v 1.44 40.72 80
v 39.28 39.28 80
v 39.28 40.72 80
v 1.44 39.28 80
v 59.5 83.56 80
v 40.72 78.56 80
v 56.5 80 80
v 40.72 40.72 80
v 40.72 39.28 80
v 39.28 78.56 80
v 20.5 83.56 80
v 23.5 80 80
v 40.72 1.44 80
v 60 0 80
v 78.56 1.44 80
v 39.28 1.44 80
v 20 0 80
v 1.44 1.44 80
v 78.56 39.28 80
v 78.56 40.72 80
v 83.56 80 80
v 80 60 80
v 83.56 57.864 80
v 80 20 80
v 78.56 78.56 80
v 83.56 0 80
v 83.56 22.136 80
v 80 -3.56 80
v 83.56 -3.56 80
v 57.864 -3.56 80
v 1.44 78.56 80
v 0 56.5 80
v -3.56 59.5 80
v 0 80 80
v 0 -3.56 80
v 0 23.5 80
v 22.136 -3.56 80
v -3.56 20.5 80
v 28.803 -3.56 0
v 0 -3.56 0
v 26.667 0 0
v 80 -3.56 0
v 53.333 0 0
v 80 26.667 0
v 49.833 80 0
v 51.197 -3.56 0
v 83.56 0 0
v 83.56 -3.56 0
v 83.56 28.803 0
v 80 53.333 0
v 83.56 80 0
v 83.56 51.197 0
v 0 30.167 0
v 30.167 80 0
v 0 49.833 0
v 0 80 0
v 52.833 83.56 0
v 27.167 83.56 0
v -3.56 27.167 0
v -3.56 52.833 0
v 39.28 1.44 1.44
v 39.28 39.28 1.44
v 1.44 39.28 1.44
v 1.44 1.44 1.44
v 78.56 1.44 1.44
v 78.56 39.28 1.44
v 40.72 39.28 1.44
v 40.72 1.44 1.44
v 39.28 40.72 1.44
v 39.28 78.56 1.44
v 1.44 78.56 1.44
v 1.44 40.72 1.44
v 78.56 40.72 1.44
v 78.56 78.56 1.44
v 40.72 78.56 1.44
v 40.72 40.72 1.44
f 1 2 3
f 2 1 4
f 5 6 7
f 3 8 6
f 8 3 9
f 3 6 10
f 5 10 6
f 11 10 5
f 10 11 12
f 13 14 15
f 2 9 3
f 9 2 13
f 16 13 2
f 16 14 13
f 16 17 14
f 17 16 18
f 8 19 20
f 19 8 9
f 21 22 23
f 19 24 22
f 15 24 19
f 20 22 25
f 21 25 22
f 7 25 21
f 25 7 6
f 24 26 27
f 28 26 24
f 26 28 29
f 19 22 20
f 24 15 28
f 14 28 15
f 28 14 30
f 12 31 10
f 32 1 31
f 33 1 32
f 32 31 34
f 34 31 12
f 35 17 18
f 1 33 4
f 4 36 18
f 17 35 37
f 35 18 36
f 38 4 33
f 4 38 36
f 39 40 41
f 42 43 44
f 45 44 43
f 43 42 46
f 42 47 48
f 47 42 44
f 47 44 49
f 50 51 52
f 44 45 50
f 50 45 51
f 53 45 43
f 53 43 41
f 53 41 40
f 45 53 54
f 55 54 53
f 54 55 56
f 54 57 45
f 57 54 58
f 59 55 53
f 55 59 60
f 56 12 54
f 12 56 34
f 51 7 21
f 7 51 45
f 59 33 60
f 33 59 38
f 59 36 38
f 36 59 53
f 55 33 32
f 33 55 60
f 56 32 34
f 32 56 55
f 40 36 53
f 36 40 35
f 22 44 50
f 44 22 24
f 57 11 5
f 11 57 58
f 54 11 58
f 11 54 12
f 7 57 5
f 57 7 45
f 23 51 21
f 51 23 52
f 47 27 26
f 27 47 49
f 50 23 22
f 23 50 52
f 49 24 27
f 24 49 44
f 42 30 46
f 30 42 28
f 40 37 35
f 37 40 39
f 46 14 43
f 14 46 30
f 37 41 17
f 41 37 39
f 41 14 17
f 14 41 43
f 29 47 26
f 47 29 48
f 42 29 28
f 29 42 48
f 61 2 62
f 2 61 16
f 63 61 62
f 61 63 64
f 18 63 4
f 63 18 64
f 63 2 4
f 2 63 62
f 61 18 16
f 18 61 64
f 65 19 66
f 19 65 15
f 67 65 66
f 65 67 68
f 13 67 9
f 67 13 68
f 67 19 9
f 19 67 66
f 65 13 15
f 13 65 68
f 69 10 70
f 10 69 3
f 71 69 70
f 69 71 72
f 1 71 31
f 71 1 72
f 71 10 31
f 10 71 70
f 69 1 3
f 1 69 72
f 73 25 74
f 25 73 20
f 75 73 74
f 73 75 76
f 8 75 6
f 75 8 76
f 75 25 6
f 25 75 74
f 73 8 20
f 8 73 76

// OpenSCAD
// file: lib/frame.scad
/*
 * frame.scad
 *
 * Part of the Modular Drawer System.
 *
 * (c) 2015 max thom stahl. Released under the Creative Commons Share-Alike
 * license. See LICENSE for details.
 */

//-[ Connector settings ]------------------------------------------------------

/* old_tolerance = tolerance; */
/* tolerance = 0.5; */

connector_thickness = 5.0;
groove_top_width    = frame_outer/2;
groove_bottom_width = frame_outer/3;
groove_depth        = 3.0;
tongue_top_width    = frame_outer/2 - 2*tolerance;
tongue_bottom_width = frame_outer/3 - 2*tolerance;
tongue_depth        = 3.0;

groove_top_y0    = (frame_outer - groove_top_width)/2;
groove_top_y1    = groove_top_y0 + groove_top_width;
groove_bottom_y0 = (frame_outer - groove_bottom_width)/2;
groove_bottom_y1 = groove_bottom_y0 + groove_bottom_width;

tongue_top_y0    = (frame_outer - tongue_top_width)/2;
tongue_top_y1    = tongue_top_y0 + tongue_top_width;
tongue_bottom_y0 = (frame_outer - tongue_bottom_width)/2;
tongue_bottom_y1 = tongue_bottom_y0 + tongue_bottom_width;

module groove_cutout() {
  polyhedron(points=[
    [0, -groove_bottom_width/2, 0],                                          // [0]
    [0, -groove_top_width/2, frame_outer],                                   // [1]
    [0, groove_top_width/2, frame_outer],                                    // [2]
    [0, groove_bottom_width/2, 0],                                           // [3]
    [connector_thickness, -groove_bottom_width/2 + groove_depth, 0],         // [4]
    [connector_thickness, -groove_top_width/2 + groove_depth, frame_outer],  // [5]
    [connector_thickness, groove_top_width/2 - groove_depth, frame_outer],   // [6]
    [connector_thickness, groove_bottom_width/2 - groove_depth, 0]           // [7]
  ], faces=[
    [5,6,7,4], [1,2,6,5], [2,1,0,3], [4,7,3,0], [1,5,4,0], [6,2,3,7]
  ]);
}

module tongue() {
  polyhedron(points=[
    [connector_thickness - wall_thickness, -tongue_top_width/2, frame_outer], // [0]
    [connector_thickness - wall_thickness, tongue_top_width/2, frame_outer],  // [1]
    [connector_thickness - wall_thickness, tongue_bottom_width/2, 0],         // [2]
    [connector_thickness - wall_thickness, -tongue_bottom_width/2, 0],        // [3]
    [0, -tongue_top_width/2 + groove_depth, frame_outer],                     // [4]
    [0, tongue_top_width/2 - groove_depth, frame_outer],                      // [5]
    [0, tongue_bottom_width/2 - groove_depth, 0],                             // [6]
    [0, -tongue_bottom_width/2 + groove_depth, 0]                             // [7]
  ], faces=[
    [0,1,2,3], [5,4,7,6], [4,5,1,0], [4,0,3,7], [1,5,6,2], [3,2,6,7]
  ]);
}

module connector_female() {
  difference() {
    cube([connector_thickness, frame_outer, frame_outer]);
    translate([wall_thickness, frame_outer/2, 0]) groove_cutout();
  }
}

module connector_male() {
  union() {
    cube([wall_thickness, frame_outer, frame_outer]);
    translate([wall_thickness, frame_outer/2, 0]) tongue();
  }
}

module outer_frame() {
  cube([frame_outer, frame_outer, frame_outer]);
}

module whole_frame() {
  outer_frame();

  translate([wall_thickness, frame_outer, 0])
    rotate([0, 0, 180])
    connector_male();

  translate([frame_outer, frame_outer - wall_thickness, 0])
    rotate([0, 0, 90])
    connector_male();

  translate([frame_outer - wall_thickness, 0, 0])
    rotate([0, 0, 0])
    connector_female();

  translate([0, wall_thickness, 0])
    rotate([0, 0, 270])
    connector_female();
  translate([frame_outer, -connector_thickness + wall_thickness, 0])
    cube([connector_thickness - wall_thickness, connector_thickness, frame_outer]);
}
// file: configuration.scad
/*
 * configuration.scad
 *
 * Part of the Modular Drawer System.
 *
 * (c) 2015 max thom stahl. Released under the Creative Commons Share-Alike
 * license. See LICENSE for details.
 */

// These settings will move into a header file soon
frame_outer = 80.0;
wall_thickness = 0.48 * 3;
frame_inner = frame_outer - 2*wall_thickness;
tolerance = 0.5;
// main file
/*
 * frame2x2.scad
 *
 * Use this frame with `drawer2x2`.
 *
 * Part of the Modular Drawer System.
 *
 * (c) 2015 max thom stahl. Released under the Creative Commons Share-Alike
 * license. See LICENSE for details.
 */

include <configuration.scad>;
include <lib/frame.scad>;

cavity_width = (frame_inner - wall_thickness)/2;
cavity_height = (frame_inner - wall_thickness)/2;
cavity_depth = frame_outer;

difference() {
  whole_frame();
  translate([wall_thickness, wall_thickness, wall_thickness])
    cube([cavity_width, cavity_height, cavity_depth]);
  translate([2*wall_thickness + cavity_width, wall_thickness, wall_thickness])
    cube([cavity_width, cavity_height, cavity_depth]);
  translate([wall_thickness, 2*wall_thickness + cavity_height, wall_thickness])
    cube([cavity_width, cavity_height, cavity_depth]);
  translate([2*wall_thickness + cavity_width, 2*wall_thickness + cavity_height, wall_thickness])
    cube([cavity_width, cavity_height, cavity_depth]);
}
